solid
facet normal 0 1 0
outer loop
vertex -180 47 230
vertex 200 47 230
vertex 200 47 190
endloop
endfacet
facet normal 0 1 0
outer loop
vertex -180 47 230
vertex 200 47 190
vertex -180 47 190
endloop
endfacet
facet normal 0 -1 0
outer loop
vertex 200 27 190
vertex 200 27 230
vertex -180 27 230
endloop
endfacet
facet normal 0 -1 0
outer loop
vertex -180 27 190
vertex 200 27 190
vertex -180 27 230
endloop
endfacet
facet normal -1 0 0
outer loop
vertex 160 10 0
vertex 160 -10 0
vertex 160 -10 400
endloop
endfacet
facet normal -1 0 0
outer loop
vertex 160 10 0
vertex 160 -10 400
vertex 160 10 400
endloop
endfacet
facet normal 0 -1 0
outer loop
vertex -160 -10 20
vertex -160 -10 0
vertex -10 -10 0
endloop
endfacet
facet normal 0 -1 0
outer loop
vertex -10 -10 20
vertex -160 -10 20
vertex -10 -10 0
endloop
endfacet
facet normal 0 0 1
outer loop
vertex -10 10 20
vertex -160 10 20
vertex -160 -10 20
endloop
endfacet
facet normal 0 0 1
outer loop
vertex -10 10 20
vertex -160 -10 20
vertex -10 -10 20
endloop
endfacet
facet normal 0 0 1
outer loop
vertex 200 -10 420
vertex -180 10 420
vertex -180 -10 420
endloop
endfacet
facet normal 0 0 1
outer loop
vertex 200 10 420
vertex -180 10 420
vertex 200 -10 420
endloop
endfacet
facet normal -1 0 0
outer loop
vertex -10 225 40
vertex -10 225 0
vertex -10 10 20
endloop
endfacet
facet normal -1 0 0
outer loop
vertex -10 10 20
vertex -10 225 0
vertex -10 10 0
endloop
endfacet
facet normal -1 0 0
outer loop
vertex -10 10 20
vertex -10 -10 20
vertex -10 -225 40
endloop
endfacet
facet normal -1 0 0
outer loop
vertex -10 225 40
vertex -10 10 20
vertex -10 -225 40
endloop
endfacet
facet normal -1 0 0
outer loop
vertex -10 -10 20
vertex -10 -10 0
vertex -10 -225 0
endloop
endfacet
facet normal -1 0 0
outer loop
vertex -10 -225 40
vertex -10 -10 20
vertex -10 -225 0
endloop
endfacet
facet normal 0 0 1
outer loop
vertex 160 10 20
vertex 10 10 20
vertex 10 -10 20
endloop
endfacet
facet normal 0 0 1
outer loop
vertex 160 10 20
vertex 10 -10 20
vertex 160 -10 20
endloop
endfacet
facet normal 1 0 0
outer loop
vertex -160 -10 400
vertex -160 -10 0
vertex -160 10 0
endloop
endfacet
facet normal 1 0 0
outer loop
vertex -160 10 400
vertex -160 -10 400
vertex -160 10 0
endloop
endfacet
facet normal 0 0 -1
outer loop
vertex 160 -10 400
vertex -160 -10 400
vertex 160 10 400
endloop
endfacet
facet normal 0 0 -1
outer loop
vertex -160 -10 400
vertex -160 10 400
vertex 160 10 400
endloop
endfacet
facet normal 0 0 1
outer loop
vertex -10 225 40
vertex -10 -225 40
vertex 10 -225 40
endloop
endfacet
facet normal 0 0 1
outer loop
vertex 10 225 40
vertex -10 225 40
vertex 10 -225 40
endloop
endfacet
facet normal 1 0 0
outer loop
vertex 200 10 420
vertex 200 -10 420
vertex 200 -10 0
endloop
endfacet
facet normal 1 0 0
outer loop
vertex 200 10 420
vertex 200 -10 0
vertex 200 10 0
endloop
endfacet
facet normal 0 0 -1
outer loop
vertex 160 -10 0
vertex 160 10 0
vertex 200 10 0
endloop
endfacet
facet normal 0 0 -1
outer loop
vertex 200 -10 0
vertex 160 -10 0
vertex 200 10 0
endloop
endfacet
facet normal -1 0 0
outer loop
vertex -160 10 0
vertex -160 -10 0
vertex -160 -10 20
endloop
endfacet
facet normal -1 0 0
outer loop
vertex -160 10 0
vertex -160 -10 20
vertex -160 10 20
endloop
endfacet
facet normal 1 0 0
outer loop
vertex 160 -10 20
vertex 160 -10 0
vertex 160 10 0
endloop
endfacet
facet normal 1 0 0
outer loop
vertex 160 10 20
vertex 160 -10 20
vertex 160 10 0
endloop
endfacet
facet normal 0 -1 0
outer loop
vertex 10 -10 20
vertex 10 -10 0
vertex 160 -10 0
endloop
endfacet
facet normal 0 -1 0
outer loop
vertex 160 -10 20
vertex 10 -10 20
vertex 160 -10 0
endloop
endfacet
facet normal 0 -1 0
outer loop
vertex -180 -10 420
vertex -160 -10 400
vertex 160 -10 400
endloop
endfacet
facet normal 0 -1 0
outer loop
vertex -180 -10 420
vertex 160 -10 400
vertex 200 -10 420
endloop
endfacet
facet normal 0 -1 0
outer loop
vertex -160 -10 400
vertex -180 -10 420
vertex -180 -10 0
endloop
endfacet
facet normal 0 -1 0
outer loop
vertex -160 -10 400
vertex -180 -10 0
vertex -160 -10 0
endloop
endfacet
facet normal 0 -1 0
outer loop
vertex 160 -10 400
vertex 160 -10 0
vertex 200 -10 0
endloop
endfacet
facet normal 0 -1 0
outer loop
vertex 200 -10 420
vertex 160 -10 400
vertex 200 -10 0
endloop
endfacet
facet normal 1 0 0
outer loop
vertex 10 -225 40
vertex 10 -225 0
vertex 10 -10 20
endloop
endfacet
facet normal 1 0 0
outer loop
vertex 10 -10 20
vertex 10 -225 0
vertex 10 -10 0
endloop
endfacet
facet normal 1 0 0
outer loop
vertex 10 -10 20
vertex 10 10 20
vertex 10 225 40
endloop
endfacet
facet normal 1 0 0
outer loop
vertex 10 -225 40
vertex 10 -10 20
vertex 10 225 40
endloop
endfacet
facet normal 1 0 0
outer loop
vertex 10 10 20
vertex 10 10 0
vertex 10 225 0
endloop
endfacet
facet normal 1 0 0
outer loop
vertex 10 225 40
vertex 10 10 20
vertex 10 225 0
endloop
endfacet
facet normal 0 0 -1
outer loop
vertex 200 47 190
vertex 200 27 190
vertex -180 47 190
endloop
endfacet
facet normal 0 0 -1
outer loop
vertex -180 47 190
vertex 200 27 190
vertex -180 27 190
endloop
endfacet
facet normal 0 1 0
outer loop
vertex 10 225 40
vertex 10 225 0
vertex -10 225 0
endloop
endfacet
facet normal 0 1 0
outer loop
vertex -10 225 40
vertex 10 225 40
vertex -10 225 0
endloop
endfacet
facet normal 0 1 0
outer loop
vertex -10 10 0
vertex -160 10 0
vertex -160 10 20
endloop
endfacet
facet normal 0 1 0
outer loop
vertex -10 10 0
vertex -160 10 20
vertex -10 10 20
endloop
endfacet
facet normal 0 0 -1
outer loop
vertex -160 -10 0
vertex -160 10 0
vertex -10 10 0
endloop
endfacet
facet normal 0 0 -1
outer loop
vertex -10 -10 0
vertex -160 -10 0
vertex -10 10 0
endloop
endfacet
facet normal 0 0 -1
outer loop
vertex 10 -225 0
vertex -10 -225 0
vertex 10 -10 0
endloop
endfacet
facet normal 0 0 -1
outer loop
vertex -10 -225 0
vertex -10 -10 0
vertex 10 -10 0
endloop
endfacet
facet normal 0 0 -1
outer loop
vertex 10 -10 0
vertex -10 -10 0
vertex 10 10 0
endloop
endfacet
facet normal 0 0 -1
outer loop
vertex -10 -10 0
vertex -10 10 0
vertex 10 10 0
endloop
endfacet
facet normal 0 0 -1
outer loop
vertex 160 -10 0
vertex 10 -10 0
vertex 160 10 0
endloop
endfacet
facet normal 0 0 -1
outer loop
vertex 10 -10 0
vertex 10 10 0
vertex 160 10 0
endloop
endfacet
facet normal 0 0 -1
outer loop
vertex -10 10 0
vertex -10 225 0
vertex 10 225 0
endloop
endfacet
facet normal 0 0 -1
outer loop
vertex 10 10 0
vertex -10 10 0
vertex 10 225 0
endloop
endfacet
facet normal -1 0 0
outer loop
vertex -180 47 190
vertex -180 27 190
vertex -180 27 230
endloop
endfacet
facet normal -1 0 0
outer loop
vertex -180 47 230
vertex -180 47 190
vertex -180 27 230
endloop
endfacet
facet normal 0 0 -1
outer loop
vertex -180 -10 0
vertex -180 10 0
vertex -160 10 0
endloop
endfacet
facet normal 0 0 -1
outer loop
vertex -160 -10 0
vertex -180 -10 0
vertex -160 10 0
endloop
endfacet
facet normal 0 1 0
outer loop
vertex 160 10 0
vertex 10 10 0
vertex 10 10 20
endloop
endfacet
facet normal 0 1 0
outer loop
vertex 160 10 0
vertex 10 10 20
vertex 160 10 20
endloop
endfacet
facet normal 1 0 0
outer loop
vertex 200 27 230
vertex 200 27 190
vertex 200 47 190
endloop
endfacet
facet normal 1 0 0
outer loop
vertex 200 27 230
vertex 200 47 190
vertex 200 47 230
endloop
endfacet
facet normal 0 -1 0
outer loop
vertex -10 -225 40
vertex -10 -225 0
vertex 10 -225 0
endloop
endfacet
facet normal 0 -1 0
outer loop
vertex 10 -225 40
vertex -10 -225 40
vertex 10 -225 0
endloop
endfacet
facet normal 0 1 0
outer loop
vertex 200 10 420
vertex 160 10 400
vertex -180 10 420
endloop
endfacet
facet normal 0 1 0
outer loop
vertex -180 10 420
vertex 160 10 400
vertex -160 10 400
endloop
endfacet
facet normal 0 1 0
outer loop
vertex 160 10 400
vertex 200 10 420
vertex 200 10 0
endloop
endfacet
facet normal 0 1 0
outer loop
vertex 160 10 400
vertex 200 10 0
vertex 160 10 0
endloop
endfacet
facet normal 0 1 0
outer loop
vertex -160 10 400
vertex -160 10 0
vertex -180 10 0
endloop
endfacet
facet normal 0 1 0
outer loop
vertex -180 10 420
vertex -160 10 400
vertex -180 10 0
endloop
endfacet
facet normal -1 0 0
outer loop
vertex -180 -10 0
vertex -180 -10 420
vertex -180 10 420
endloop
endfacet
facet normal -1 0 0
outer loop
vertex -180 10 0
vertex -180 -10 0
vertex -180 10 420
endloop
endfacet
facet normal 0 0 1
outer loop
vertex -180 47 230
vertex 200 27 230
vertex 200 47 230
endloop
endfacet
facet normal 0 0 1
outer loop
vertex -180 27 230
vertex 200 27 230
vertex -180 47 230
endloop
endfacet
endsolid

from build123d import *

# Parameters (mm, degrees)
F1_DEPTH = 40
F0_W     = 150
F0_H     = 20
F2_DEPTH = 20
F0_W_2   = 20
F3_DEPTH = 400
F0_W_3   = 40
F4_W     = 360
F4_H     = 20
F4_W_2   = 20
F5_DEPTH = 20
F7_W     = 380
F7_H     = 40
F8_DEPTH = 20


with BuildPart() as f1:
    # F0 (on Top) → F1 (new body)
    with BuildSketch(Plane.XY):
        Polygon((-10, -225), (10, -225), (10, -10), (10, 10), (10, 225), (-10, 225), (-10, 10), (-10, -10), align=None)
    extrude(amount=F1_DEPTH)

    # F0 (on Top) → F2 (join)
    with BuildSketch(Plane.XY):
        with Locations((-85, 0)):
            Rectangle(F0_W, F0_H)
        with Locations((85, 0)):
            Rectangle(F0_W, F0_H)
    extrude(amount=F2_DEPTH)


with BuildPart() as f3:
    # F0 (on Top) → F3 (new body)
    with BuildSketch(Plane.XY):
        with Locations((-170, 0)):
            Rectangle(F0_W_2, F0_H)
    extrude(amount=F3_DEPTH)



with BuildPart() as f3b:
    # F0 (on Top) → F3, piece 2 (new body)
    with BuildSketch(Plane.XY):
        with Locations((180, 0)):
            Rectangle(F0_W_3, F0_H)
    extrude(amount=F3_DEPTH)


with BuildPart() as f3_1:
    add(f3.part)

    add(f3b.part)  # F5 merges F3b
    # F4 (on face) → F5 (join)
    with BuildSketch(Plane.XY.offset(400)):
        with Locations((20, 0)):
            Rectangle(F4_W, F4_H)
        with Locations((-170, 0)):
            Rectangle(F4_W_2, F4_H)
    extrude(amount=F5_DEPTH)


with BuildPart() as f8:
    # F7 (on offset) → F8 (new body)
    with BuildSketch(Plane(origin=(0, 27, 0), x_dir=(-1, 0, 0), z_dir=(0, 1, 0))):
        with Locations((-10, 210)):
            Rectangle(F7_W, F7_H)
    extrude(amount=F8_DEPTH)


solid = Compound([f1.part, f3_1.part, f8.part])
